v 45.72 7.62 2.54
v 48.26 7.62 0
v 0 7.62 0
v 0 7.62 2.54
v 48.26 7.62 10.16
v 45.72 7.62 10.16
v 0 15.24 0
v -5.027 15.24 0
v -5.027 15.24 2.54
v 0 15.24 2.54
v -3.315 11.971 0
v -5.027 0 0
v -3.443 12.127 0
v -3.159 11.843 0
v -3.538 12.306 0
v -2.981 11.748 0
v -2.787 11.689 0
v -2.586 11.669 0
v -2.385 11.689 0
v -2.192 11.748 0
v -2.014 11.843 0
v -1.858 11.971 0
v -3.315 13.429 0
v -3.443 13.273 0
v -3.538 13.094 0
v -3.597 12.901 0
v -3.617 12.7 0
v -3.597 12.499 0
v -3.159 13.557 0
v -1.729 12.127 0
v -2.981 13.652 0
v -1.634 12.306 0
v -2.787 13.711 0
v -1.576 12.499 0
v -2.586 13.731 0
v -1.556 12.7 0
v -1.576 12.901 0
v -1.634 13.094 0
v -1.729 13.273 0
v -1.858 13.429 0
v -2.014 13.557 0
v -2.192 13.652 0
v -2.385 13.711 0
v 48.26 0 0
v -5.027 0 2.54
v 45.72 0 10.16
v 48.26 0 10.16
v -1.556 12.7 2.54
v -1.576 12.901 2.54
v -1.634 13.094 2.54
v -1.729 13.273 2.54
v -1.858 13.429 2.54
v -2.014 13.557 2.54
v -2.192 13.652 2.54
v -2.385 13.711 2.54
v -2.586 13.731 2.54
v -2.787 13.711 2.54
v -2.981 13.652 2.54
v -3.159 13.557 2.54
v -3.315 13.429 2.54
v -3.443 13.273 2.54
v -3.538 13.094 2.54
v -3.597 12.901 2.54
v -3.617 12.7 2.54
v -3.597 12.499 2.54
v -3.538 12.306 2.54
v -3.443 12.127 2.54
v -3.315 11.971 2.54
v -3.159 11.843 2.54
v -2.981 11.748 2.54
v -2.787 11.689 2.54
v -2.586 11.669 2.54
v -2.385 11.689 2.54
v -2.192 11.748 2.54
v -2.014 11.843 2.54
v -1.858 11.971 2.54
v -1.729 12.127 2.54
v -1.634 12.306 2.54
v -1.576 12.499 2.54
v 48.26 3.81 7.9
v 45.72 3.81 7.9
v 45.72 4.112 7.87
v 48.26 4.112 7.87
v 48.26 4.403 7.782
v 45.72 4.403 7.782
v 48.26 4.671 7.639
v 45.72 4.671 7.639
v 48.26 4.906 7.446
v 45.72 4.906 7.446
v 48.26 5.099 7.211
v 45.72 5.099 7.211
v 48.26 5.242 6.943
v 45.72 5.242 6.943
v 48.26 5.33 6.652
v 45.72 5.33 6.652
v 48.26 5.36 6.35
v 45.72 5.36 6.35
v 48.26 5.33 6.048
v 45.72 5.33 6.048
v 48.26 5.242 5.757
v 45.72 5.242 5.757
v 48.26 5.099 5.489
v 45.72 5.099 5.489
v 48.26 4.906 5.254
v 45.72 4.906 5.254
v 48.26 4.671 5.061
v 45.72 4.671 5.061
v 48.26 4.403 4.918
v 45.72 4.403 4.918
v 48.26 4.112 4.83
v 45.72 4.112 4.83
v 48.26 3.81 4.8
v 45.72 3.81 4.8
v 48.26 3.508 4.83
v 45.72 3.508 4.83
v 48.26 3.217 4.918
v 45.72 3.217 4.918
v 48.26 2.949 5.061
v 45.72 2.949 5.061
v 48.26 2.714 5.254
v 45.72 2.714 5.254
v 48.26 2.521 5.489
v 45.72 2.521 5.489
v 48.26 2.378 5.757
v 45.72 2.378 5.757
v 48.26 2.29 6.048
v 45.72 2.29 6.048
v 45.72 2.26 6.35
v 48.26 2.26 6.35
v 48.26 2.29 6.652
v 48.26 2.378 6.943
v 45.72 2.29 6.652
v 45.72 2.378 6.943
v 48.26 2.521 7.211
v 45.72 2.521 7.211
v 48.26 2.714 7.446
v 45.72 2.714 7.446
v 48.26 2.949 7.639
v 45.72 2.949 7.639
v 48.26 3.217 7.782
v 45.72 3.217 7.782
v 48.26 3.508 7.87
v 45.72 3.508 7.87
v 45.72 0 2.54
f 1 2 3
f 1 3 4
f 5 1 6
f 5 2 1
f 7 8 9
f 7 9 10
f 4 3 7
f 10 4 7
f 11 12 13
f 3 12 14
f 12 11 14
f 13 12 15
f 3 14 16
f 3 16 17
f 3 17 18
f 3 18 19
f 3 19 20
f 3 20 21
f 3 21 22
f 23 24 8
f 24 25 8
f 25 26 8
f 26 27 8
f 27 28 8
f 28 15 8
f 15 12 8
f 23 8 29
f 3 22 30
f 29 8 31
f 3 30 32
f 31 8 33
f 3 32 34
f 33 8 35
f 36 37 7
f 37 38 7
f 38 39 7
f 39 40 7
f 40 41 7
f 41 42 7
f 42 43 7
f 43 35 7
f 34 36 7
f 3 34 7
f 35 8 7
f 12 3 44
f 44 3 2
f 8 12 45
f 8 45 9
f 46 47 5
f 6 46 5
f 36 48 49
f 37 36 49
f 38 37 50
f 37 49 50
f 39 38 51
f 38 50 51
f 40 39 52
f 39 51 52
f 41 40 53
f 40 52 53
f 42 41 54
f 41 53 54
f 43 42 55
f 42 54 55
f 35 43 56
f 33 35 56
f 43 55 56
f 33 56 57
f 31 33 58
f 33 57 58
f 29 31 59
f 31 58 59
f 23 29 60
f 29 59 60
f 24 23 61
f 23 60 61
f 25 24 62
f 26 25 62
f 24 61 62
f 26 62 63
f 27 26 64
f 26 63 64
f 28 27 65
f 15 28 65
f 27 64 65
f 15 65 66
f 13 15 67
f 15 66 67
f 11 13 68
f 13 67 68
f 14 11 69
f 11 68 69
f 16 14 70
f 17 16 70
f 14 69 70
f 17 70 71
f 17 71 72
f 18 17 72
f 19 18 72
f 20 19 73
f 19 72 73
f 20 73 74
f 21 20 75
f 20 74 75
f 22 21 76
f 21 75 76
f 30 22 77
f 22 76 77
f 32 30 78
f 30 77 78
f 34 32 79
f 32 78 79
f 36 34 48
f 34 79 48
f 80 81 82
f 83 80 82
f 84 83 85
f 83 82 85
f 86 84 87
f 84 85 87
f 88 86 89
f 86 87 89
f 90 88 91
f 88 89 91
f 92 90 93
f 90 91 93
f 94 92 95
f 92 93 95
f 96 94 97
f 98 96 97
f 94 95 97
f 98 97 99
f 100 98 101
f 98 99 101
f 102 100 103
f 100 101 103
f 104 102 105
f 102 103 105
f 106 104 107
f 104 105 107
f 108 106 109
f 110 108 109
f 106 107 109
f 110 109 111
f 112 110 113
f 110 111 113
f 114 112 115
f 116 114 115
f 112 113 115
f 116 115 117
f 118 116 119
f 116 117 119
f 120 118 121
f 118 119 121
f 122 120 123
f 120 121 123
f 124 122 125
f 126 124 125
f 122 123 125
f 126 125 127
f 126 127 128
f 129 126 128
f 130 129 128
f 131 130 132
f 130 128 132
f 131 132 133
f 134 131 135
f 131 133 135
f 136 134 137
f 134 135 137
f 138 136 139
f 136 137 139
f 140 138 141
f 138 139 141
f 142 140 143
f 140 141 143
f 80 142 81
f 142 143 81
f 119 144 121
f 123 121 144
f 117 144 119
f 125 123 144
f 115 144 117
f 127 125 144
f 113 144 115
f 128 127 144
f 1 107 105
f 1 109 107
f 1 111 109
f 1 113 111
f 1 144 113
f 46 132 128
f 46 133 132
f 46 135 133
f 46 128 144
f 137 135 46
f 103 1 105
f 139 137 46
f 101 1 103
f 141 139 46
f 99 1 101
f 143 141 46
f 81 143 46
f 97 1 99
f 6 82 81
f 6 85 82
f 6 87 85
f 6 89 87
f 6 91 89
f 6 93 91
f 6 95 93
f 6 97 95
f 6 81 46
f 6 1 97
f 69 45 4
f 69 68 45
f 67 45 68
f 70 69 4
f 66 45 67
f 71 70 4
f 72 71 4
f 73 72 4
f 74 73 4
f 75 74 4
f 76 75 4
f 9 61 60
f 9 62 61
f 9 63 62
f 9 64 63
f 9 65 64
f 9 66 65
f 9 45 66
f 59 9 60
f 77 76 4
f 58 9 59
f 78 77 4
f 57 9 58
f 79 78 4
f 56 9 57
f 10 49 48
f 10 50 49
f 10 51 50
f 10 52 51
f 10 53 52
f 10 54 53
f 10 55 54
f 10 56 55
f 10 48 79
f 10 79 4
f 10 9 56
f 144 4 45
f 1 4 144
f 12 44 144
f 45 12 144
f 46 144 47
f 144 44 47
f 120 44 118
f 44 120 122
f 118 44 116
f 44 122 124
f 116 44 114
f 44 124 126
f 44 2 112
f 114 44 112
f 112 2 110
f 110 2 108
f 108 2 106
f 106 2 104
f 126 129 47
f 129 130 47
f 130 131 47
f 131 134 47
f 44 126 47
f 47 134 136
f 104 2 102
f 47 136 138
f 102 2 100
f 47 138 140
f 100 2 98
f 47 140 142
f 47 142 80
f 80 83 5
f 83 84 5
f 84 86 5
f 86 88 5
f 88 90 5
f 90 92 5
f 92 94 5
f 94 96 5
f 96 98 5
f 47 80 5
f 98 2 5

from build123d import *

# Parameters (mm, degrees)
SKETCH2_W           = 48.26
SKETCH2_H           = 7.62
BOSS_EXTRUDE1_DEPTH = 2.54
SKETCH3_W           = 5.026957718
SKETCH3_H           = 15.24
BOSS_EXTRUDE2_DEPTH = 2.54
SKETCH4_R           = 1.030507416
CUT_EXTRUDE1_DEPTH  = 2.54
SKETCH5_W           = 7.62
SKETCH5_H           = 7.62
BOSS_EXTRUDE3_DEPTH = 2.54
SKETCH6_R           = 1.55
CUT_EXTRUDE2_DEPTH  = 2.54


with BuildPart() as part:
    # Sketch2 → Boss-Extrude1 (new body)
    with BuildSketch(Plane.XY):
        with Locations((24.13, 3.81)):
            Rectangle(SKETCH2_W, SKETCH2_H)
    extrude(amount=BOSS_EXTRUDE1_DEPTH)

    # Sketch3 → Boss-Extrude2 (add)
    with BuildSketch(Plane.XY):
        with Locations((-2.513478859, 7.62)):
            Rectangle(SKETCH3_W, SKETCH3_H)
    extrude(amount=BOSS_EXTRUDE2_DEPTH)

    # Sketch4 → Cut-Extrude1 (cut)
    with BuildSketch(Plane.XY.offset(2.54)):
        with Locations((-2.586282317, 12.7)):
            Circle(SKETCH4_R)
    extrude(amount=-CUT_EXTRUDE1_DEPTH, mode=Mode.SUBTRACT)

    # Sketch5 → Boss-Extrude3 (add)
    with BuildSketch(Plane.ZY.offset(-48.26)):
        with Locations((6.35, 3.81)):
            Rectangle(SKETCH5_W, SKETCH5_H)
    extrude(amount=BOSS_EXTRUDE3_DEPTH)

    # Sketch6 → Cut-Extrude2 (cut)
    with BuildSketch(Plane.ZY.offset(-45.72)):
        with Locations((6.35, 3.81)):
            Circle(SKETCH6_R)
    extrude(amount=-CUT_EXTRUDE2_DEPTH, mode=Mode.SUBTRACT)


solid = part.part
